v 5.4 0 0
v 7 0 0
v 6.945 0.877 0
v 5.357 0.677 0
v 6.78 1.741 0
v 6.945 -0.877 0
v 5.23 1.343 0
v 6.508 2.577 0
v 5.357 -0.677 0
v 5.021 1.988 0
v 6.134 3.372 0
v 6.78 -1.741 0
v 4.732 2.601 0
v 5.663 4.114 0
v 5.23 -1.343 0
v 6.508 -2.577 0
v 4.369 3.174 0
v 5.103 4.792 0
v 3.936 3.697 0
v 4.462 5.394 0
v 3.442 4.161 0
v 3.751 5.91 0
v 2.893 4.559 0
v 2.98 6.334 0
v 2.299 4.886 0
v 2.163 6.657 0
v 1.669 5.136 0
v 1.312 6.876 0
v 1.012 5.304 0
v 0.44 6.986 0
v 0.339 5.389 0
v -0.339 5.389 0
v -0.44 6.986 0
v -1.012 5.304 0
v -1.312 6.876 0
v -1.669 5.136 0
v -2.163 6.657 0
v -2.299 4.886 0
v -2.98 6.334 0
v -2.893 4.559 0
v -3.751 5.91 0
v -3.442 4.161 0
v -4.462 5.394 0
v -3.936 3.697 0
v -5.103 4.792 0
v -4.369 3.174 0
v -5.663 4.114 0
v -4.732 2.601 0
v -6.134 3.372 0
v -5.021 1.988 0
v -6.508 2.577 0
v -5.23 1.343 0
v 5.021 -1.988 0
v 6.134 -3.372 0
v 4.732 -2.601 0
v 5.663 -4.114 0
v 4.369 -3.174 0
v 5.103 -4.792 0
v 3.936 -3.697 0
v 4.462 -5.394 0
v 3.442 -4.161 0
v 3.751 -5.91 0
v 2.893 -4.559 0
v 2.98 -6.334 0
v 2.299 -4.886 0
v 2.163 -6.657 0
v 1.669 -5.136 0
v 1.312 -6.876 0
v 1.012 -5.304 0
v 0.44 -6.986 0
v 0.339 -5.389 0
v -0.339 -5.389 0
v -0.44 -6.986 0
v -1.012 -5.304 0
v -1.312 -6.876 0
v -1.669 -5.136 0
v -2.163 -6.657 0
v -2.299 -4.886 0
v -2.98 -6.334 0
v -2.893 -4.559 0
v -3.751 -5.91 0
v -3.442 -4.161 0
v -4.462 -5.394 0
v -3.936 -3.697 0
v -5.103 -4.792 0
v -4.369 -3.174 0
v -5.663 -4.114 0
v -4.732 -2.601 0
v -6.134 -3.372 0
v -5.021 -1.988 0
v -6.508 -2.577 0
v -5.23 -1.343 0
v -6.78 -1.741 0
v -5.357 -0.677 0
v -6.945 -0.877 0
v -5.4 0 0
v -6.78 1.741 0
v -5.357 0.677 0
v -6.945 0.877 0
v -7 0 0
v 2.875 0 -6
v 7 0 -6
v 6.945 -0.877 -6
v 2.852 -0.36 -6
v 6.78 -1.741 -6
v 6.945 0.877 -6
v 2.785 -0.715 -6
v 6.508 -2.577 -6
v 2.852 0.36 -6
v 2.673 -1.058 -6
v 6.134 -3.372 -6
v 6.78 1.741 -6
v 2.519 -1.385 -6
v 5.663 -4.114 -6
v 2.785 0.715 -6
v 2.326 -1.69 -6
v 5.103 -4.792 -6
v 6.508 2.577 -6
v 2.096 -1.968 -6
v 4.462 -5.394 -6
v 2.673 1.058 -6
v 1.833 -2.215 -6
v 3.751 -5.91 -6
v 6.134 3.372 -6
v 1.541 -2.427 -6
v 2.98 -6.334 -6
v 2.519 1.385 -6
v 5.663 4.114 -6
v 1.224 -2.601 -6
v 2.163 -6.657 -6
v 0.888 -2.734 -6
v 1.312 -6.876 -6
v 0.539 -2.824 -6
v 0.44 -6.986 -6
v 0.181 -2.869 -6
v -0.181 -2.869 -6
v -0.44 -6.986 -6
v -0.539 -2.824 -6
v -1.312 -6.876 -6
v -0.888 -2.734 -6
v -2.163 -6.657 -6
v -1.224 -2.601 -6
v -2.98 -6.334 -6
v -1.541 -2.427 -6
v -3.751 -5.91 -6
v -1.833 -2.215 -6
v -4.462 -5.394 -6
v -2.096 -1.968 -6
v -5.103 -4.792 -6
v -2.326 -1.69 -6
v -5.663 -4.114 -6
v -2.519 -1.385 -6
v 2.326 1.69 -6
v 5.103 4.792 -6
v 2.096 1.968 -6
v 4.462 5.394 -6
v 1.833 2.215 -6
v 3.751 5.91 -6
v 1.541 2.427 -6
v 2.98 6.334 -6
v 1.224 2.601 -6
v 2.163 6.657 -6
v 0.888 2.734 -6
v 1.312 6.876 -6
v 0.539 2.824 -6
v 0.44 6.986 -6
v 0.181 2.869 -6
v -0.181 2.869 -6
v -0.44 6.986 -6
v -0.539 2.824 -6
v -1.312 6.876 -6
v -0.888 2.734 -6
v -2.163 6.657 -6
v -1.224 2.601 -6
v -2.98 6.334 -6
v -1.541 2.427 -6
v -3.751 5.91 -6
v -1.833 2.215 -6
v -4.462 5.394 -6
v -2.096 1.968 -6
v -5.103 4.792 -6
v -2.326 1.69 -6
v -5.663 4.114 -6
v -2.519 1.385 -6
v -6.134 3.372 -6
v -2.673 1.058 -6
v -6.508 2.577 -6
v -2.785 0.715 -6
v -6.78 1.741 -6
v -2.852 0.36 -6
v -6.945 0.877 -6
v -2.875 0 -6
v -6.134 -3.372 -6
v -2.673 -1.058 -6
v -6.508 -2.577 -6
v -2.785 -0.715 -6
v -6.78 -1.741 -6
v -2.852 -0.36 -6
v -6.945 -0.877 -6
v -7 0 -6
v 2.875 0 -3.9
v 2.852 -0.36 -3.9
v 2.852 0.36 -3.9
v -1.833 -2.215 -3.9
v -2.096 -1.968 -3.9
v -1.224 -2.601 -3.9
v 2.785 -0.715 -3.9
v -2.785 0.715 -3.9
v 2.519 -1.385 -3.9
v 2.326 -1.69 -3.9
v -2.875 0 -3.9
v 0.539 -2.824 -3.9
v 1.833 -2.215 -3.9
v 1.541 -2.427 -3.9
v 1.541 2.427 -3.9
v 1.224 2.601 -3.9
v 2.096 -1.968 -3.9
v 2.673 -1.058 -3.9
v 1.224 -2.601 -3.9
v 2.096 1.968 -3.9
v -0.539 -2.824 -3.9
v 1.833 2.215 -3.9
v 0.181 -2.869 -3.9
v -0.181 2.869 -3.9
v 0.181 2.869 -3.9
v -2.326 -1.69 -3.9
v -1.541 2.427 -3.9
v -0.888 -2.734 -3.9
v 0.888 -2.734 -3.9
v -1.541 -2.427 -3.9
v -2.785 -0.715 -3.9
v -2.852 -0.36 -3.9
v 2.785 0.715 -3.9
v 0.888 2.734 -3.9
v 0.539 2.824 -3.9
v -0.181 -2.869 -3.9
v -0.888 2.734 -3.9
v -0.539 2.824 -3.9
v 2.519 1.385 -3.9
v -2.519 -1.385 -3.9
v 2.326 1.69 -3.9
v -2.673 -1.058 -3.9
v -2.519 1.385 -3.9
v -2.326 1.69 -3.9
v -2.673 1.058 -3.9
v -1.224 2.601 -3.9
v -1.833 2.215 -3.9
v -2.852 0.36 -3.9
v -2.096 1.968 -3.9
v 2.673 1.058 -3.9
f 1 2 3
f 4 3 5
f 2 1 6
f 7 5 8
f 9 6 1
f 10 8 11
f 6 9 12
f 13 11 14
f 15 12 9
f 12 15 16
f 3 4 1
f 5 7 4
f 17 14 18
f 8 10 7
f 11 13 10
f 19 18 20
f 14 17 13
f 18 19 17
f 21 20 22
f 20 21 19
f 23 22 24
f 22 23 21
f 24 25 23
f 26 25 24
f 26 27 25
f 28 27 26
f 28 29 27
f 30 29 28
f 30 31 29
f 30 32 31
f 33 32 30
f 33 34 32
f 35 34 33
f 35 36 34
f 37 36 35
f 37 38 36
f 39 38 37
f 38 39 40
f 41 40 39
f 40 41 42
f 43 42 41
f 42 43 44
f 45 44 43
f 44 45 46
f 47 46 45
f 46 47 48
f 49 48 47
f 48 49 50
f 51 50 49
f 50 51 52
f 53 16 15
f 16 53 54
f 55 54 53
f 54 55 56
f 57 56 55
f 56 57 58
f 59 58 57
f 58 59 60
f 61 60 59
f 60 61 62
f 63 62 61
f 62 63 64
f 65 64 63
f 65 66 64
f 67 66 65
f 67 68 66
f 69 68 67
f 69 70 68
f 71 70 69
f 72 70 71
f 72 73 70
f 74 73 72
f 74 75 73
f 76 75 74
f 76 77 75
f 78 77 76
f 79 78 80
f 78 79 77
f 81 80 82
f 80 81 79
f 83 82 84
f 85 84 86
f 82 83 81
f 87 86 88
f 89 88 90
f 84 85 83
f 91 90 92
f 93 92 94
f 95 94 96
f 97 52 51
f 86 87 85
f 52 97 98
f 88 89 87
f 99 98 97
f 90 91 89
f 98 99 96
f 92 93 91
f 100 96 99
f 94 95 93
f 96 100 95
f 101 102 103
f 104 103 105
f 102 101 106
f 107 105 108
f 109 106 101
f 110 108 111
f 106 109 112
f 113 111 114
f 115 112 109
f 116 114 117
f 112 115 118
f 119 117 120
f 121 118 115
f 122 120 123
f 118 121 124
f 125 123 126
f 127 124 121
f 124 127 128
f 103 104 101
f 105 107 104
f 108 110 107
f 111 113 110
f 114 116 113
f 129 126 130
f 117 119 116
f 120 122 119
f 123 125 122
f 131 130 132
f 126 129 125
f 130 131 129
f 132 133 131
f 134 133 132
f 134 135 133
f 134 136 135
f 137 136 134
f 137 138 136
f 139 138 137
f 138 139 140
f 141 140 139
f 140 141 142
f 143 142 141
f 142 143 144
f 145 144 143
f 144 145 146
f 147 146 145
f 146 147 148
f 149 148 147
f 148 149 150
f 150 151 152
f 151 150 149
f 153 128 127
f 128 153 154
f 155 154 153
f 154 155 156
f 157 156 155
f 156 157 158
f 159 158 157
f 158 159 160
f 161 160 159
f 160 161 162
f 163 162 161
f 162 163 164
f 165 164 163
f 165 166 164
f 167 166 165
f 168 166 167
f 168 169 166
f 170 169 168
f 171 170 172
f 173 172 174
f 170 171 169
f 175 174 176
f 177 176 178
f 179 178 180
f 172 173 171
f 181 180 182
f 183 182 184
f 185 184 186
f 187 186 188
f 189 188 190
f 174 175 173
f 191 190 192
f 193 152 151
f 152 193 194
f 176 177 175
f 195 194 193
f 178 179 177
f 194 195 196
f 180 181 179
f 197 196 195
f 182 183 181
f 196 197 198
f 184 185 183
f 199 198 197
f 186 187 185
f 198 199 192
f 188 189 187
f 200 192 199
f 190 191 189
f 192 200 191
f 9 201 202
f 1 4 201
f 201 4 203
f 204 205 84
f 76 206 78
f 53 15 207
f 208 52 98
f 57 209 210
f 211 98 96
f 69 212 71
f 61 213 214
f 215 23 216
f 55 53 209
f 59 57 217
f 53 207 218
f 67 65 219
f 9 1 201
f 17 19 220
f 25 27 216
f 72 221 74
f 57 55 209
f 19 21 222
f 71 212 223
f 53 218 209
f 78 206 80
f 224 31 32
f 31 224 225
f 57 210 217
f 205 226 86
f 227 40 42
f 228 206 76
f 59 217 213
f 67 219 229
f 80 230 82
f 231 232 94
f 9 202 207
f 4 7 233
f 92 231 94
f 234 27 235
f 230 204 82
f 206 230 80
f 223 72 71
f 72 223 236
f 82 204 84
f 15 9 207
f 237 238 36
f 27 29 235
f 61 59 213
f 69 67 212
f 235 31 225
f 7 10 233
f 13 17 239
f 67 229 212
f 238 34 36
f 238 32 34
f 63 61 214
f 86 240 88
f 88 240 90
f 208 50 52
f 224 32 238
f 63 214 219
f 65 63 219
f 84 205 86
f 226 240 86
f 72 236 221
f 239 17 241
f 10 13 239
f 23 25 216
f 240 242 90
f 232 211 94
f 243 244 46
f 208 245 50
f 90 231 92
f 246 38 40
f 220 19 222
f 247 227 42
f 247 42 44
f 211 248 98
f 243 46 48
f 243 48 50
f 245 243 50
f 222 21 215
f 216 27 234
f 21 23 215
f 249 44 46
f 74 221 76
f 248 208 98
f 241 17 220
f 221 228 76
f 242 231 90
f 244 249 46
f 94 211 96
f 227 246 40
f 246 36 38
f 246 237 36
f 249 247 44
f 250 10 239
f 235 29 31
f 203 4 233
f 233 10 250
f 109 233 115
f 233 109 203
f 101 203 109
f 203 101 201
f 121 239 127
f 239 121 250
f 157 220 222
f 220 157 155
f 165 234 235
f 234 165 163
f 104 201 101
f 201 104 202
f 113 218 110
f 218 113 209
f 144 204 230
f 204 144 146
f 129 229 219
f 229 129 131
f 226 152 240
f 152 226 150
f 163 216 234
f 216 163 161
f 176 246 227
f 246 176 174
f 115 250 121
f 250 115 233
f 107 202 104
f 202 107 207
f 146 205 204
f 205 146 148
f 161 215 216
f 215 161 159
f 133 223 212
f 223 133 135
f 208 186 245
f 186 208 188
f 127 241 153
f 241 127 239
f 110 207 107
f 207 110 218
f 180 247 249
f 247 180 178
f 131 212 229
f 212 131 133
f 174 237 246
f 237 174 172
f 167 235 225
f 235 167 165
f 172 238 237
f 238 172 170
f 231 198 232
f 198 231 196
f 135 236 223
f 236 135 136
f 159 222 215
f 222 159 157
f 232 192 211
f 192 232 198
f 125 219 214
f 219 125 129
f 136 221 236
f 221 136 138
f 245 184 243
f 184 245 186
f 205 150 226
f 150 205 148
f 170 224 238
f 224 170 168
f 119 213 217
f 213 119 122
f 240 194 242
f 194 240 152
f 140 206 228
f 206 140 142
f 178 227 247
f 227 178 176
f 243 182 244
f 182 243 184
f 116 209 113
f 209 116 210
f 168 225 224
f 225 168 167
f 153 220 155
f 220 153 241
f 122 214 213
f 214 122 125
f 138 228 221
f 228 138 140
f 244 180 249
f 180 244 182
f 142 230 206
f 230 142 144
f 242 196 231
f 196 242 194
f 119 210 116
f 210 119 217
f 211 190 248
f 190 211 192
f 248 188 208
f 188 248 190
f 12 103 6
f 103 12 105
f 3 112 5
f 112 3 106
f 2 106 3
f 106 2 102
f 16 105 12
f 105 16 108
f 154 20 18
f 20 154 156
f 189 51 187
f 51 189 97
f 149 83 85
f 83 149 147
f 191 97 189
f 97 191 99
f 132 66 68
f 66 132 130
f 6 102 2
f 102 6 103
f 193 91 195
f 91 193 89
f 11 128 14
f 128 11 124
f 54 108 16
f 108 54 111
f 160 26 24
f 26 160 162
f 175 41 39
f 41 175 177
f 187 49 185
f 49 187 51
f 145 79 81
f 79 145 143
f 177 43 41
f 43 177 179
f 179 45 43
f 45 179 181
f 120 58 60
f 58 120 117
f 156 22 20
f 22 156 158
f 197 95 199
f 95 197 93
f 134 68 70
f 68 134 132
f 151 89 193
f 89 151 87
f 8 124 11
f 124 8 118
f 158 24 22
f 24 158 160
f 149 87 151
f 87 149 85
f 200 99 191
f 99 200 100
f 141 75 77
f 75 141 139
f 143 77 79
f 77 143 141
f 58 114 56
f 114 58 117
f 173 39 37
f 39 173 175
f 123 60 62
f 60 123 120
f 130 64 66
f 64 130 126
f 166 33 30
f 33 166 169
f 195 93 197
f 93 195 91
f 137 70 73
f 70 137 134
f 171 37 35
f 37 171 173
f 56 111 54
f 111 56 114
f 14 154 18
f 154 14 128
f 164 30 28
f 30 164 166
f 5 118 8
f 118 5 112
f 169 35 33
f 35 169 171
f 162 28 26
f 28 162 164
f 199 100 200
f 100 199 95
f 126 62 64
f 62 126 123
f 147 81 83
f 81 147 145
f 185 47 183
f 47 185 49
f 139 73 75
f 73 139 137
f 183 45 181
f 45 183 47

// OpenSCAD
$fn = 50;


difference() {
	union() {
		translate(v = [0, 0, -6.0000000000]) {
			cylinder(h = 6, r = 7.0000000000);
		}
		cylinder(h = 0, r = 16.0000000000);
	}
	union() {
		translate(v = [0, 0, 0]) {
			rotate(a = [0, 0, 0]) {
				difference() {
					union() {
						#translate(v = [0, 0, -6.0000000000]) {
							cylinder(h = 6, r = 2.6000000000);
						}
						#translate(v = [0, 0, -3.9000000000]) {
							cylinder(h = 3.9000000000, r1 = 2.8750000000, r2 = 5.4000000000);
						}
						#translate(v = [0, 0, -6.0000000000]) {
							cylinder(h = 6, r = 2.8750000000);
						}
						#translate(v = [0, 0, -6.0000000000]) {
							cylinder(h = 6, r = 2.6000000000);
						}
					}
					union();
				}
			}
		}
	}
}
